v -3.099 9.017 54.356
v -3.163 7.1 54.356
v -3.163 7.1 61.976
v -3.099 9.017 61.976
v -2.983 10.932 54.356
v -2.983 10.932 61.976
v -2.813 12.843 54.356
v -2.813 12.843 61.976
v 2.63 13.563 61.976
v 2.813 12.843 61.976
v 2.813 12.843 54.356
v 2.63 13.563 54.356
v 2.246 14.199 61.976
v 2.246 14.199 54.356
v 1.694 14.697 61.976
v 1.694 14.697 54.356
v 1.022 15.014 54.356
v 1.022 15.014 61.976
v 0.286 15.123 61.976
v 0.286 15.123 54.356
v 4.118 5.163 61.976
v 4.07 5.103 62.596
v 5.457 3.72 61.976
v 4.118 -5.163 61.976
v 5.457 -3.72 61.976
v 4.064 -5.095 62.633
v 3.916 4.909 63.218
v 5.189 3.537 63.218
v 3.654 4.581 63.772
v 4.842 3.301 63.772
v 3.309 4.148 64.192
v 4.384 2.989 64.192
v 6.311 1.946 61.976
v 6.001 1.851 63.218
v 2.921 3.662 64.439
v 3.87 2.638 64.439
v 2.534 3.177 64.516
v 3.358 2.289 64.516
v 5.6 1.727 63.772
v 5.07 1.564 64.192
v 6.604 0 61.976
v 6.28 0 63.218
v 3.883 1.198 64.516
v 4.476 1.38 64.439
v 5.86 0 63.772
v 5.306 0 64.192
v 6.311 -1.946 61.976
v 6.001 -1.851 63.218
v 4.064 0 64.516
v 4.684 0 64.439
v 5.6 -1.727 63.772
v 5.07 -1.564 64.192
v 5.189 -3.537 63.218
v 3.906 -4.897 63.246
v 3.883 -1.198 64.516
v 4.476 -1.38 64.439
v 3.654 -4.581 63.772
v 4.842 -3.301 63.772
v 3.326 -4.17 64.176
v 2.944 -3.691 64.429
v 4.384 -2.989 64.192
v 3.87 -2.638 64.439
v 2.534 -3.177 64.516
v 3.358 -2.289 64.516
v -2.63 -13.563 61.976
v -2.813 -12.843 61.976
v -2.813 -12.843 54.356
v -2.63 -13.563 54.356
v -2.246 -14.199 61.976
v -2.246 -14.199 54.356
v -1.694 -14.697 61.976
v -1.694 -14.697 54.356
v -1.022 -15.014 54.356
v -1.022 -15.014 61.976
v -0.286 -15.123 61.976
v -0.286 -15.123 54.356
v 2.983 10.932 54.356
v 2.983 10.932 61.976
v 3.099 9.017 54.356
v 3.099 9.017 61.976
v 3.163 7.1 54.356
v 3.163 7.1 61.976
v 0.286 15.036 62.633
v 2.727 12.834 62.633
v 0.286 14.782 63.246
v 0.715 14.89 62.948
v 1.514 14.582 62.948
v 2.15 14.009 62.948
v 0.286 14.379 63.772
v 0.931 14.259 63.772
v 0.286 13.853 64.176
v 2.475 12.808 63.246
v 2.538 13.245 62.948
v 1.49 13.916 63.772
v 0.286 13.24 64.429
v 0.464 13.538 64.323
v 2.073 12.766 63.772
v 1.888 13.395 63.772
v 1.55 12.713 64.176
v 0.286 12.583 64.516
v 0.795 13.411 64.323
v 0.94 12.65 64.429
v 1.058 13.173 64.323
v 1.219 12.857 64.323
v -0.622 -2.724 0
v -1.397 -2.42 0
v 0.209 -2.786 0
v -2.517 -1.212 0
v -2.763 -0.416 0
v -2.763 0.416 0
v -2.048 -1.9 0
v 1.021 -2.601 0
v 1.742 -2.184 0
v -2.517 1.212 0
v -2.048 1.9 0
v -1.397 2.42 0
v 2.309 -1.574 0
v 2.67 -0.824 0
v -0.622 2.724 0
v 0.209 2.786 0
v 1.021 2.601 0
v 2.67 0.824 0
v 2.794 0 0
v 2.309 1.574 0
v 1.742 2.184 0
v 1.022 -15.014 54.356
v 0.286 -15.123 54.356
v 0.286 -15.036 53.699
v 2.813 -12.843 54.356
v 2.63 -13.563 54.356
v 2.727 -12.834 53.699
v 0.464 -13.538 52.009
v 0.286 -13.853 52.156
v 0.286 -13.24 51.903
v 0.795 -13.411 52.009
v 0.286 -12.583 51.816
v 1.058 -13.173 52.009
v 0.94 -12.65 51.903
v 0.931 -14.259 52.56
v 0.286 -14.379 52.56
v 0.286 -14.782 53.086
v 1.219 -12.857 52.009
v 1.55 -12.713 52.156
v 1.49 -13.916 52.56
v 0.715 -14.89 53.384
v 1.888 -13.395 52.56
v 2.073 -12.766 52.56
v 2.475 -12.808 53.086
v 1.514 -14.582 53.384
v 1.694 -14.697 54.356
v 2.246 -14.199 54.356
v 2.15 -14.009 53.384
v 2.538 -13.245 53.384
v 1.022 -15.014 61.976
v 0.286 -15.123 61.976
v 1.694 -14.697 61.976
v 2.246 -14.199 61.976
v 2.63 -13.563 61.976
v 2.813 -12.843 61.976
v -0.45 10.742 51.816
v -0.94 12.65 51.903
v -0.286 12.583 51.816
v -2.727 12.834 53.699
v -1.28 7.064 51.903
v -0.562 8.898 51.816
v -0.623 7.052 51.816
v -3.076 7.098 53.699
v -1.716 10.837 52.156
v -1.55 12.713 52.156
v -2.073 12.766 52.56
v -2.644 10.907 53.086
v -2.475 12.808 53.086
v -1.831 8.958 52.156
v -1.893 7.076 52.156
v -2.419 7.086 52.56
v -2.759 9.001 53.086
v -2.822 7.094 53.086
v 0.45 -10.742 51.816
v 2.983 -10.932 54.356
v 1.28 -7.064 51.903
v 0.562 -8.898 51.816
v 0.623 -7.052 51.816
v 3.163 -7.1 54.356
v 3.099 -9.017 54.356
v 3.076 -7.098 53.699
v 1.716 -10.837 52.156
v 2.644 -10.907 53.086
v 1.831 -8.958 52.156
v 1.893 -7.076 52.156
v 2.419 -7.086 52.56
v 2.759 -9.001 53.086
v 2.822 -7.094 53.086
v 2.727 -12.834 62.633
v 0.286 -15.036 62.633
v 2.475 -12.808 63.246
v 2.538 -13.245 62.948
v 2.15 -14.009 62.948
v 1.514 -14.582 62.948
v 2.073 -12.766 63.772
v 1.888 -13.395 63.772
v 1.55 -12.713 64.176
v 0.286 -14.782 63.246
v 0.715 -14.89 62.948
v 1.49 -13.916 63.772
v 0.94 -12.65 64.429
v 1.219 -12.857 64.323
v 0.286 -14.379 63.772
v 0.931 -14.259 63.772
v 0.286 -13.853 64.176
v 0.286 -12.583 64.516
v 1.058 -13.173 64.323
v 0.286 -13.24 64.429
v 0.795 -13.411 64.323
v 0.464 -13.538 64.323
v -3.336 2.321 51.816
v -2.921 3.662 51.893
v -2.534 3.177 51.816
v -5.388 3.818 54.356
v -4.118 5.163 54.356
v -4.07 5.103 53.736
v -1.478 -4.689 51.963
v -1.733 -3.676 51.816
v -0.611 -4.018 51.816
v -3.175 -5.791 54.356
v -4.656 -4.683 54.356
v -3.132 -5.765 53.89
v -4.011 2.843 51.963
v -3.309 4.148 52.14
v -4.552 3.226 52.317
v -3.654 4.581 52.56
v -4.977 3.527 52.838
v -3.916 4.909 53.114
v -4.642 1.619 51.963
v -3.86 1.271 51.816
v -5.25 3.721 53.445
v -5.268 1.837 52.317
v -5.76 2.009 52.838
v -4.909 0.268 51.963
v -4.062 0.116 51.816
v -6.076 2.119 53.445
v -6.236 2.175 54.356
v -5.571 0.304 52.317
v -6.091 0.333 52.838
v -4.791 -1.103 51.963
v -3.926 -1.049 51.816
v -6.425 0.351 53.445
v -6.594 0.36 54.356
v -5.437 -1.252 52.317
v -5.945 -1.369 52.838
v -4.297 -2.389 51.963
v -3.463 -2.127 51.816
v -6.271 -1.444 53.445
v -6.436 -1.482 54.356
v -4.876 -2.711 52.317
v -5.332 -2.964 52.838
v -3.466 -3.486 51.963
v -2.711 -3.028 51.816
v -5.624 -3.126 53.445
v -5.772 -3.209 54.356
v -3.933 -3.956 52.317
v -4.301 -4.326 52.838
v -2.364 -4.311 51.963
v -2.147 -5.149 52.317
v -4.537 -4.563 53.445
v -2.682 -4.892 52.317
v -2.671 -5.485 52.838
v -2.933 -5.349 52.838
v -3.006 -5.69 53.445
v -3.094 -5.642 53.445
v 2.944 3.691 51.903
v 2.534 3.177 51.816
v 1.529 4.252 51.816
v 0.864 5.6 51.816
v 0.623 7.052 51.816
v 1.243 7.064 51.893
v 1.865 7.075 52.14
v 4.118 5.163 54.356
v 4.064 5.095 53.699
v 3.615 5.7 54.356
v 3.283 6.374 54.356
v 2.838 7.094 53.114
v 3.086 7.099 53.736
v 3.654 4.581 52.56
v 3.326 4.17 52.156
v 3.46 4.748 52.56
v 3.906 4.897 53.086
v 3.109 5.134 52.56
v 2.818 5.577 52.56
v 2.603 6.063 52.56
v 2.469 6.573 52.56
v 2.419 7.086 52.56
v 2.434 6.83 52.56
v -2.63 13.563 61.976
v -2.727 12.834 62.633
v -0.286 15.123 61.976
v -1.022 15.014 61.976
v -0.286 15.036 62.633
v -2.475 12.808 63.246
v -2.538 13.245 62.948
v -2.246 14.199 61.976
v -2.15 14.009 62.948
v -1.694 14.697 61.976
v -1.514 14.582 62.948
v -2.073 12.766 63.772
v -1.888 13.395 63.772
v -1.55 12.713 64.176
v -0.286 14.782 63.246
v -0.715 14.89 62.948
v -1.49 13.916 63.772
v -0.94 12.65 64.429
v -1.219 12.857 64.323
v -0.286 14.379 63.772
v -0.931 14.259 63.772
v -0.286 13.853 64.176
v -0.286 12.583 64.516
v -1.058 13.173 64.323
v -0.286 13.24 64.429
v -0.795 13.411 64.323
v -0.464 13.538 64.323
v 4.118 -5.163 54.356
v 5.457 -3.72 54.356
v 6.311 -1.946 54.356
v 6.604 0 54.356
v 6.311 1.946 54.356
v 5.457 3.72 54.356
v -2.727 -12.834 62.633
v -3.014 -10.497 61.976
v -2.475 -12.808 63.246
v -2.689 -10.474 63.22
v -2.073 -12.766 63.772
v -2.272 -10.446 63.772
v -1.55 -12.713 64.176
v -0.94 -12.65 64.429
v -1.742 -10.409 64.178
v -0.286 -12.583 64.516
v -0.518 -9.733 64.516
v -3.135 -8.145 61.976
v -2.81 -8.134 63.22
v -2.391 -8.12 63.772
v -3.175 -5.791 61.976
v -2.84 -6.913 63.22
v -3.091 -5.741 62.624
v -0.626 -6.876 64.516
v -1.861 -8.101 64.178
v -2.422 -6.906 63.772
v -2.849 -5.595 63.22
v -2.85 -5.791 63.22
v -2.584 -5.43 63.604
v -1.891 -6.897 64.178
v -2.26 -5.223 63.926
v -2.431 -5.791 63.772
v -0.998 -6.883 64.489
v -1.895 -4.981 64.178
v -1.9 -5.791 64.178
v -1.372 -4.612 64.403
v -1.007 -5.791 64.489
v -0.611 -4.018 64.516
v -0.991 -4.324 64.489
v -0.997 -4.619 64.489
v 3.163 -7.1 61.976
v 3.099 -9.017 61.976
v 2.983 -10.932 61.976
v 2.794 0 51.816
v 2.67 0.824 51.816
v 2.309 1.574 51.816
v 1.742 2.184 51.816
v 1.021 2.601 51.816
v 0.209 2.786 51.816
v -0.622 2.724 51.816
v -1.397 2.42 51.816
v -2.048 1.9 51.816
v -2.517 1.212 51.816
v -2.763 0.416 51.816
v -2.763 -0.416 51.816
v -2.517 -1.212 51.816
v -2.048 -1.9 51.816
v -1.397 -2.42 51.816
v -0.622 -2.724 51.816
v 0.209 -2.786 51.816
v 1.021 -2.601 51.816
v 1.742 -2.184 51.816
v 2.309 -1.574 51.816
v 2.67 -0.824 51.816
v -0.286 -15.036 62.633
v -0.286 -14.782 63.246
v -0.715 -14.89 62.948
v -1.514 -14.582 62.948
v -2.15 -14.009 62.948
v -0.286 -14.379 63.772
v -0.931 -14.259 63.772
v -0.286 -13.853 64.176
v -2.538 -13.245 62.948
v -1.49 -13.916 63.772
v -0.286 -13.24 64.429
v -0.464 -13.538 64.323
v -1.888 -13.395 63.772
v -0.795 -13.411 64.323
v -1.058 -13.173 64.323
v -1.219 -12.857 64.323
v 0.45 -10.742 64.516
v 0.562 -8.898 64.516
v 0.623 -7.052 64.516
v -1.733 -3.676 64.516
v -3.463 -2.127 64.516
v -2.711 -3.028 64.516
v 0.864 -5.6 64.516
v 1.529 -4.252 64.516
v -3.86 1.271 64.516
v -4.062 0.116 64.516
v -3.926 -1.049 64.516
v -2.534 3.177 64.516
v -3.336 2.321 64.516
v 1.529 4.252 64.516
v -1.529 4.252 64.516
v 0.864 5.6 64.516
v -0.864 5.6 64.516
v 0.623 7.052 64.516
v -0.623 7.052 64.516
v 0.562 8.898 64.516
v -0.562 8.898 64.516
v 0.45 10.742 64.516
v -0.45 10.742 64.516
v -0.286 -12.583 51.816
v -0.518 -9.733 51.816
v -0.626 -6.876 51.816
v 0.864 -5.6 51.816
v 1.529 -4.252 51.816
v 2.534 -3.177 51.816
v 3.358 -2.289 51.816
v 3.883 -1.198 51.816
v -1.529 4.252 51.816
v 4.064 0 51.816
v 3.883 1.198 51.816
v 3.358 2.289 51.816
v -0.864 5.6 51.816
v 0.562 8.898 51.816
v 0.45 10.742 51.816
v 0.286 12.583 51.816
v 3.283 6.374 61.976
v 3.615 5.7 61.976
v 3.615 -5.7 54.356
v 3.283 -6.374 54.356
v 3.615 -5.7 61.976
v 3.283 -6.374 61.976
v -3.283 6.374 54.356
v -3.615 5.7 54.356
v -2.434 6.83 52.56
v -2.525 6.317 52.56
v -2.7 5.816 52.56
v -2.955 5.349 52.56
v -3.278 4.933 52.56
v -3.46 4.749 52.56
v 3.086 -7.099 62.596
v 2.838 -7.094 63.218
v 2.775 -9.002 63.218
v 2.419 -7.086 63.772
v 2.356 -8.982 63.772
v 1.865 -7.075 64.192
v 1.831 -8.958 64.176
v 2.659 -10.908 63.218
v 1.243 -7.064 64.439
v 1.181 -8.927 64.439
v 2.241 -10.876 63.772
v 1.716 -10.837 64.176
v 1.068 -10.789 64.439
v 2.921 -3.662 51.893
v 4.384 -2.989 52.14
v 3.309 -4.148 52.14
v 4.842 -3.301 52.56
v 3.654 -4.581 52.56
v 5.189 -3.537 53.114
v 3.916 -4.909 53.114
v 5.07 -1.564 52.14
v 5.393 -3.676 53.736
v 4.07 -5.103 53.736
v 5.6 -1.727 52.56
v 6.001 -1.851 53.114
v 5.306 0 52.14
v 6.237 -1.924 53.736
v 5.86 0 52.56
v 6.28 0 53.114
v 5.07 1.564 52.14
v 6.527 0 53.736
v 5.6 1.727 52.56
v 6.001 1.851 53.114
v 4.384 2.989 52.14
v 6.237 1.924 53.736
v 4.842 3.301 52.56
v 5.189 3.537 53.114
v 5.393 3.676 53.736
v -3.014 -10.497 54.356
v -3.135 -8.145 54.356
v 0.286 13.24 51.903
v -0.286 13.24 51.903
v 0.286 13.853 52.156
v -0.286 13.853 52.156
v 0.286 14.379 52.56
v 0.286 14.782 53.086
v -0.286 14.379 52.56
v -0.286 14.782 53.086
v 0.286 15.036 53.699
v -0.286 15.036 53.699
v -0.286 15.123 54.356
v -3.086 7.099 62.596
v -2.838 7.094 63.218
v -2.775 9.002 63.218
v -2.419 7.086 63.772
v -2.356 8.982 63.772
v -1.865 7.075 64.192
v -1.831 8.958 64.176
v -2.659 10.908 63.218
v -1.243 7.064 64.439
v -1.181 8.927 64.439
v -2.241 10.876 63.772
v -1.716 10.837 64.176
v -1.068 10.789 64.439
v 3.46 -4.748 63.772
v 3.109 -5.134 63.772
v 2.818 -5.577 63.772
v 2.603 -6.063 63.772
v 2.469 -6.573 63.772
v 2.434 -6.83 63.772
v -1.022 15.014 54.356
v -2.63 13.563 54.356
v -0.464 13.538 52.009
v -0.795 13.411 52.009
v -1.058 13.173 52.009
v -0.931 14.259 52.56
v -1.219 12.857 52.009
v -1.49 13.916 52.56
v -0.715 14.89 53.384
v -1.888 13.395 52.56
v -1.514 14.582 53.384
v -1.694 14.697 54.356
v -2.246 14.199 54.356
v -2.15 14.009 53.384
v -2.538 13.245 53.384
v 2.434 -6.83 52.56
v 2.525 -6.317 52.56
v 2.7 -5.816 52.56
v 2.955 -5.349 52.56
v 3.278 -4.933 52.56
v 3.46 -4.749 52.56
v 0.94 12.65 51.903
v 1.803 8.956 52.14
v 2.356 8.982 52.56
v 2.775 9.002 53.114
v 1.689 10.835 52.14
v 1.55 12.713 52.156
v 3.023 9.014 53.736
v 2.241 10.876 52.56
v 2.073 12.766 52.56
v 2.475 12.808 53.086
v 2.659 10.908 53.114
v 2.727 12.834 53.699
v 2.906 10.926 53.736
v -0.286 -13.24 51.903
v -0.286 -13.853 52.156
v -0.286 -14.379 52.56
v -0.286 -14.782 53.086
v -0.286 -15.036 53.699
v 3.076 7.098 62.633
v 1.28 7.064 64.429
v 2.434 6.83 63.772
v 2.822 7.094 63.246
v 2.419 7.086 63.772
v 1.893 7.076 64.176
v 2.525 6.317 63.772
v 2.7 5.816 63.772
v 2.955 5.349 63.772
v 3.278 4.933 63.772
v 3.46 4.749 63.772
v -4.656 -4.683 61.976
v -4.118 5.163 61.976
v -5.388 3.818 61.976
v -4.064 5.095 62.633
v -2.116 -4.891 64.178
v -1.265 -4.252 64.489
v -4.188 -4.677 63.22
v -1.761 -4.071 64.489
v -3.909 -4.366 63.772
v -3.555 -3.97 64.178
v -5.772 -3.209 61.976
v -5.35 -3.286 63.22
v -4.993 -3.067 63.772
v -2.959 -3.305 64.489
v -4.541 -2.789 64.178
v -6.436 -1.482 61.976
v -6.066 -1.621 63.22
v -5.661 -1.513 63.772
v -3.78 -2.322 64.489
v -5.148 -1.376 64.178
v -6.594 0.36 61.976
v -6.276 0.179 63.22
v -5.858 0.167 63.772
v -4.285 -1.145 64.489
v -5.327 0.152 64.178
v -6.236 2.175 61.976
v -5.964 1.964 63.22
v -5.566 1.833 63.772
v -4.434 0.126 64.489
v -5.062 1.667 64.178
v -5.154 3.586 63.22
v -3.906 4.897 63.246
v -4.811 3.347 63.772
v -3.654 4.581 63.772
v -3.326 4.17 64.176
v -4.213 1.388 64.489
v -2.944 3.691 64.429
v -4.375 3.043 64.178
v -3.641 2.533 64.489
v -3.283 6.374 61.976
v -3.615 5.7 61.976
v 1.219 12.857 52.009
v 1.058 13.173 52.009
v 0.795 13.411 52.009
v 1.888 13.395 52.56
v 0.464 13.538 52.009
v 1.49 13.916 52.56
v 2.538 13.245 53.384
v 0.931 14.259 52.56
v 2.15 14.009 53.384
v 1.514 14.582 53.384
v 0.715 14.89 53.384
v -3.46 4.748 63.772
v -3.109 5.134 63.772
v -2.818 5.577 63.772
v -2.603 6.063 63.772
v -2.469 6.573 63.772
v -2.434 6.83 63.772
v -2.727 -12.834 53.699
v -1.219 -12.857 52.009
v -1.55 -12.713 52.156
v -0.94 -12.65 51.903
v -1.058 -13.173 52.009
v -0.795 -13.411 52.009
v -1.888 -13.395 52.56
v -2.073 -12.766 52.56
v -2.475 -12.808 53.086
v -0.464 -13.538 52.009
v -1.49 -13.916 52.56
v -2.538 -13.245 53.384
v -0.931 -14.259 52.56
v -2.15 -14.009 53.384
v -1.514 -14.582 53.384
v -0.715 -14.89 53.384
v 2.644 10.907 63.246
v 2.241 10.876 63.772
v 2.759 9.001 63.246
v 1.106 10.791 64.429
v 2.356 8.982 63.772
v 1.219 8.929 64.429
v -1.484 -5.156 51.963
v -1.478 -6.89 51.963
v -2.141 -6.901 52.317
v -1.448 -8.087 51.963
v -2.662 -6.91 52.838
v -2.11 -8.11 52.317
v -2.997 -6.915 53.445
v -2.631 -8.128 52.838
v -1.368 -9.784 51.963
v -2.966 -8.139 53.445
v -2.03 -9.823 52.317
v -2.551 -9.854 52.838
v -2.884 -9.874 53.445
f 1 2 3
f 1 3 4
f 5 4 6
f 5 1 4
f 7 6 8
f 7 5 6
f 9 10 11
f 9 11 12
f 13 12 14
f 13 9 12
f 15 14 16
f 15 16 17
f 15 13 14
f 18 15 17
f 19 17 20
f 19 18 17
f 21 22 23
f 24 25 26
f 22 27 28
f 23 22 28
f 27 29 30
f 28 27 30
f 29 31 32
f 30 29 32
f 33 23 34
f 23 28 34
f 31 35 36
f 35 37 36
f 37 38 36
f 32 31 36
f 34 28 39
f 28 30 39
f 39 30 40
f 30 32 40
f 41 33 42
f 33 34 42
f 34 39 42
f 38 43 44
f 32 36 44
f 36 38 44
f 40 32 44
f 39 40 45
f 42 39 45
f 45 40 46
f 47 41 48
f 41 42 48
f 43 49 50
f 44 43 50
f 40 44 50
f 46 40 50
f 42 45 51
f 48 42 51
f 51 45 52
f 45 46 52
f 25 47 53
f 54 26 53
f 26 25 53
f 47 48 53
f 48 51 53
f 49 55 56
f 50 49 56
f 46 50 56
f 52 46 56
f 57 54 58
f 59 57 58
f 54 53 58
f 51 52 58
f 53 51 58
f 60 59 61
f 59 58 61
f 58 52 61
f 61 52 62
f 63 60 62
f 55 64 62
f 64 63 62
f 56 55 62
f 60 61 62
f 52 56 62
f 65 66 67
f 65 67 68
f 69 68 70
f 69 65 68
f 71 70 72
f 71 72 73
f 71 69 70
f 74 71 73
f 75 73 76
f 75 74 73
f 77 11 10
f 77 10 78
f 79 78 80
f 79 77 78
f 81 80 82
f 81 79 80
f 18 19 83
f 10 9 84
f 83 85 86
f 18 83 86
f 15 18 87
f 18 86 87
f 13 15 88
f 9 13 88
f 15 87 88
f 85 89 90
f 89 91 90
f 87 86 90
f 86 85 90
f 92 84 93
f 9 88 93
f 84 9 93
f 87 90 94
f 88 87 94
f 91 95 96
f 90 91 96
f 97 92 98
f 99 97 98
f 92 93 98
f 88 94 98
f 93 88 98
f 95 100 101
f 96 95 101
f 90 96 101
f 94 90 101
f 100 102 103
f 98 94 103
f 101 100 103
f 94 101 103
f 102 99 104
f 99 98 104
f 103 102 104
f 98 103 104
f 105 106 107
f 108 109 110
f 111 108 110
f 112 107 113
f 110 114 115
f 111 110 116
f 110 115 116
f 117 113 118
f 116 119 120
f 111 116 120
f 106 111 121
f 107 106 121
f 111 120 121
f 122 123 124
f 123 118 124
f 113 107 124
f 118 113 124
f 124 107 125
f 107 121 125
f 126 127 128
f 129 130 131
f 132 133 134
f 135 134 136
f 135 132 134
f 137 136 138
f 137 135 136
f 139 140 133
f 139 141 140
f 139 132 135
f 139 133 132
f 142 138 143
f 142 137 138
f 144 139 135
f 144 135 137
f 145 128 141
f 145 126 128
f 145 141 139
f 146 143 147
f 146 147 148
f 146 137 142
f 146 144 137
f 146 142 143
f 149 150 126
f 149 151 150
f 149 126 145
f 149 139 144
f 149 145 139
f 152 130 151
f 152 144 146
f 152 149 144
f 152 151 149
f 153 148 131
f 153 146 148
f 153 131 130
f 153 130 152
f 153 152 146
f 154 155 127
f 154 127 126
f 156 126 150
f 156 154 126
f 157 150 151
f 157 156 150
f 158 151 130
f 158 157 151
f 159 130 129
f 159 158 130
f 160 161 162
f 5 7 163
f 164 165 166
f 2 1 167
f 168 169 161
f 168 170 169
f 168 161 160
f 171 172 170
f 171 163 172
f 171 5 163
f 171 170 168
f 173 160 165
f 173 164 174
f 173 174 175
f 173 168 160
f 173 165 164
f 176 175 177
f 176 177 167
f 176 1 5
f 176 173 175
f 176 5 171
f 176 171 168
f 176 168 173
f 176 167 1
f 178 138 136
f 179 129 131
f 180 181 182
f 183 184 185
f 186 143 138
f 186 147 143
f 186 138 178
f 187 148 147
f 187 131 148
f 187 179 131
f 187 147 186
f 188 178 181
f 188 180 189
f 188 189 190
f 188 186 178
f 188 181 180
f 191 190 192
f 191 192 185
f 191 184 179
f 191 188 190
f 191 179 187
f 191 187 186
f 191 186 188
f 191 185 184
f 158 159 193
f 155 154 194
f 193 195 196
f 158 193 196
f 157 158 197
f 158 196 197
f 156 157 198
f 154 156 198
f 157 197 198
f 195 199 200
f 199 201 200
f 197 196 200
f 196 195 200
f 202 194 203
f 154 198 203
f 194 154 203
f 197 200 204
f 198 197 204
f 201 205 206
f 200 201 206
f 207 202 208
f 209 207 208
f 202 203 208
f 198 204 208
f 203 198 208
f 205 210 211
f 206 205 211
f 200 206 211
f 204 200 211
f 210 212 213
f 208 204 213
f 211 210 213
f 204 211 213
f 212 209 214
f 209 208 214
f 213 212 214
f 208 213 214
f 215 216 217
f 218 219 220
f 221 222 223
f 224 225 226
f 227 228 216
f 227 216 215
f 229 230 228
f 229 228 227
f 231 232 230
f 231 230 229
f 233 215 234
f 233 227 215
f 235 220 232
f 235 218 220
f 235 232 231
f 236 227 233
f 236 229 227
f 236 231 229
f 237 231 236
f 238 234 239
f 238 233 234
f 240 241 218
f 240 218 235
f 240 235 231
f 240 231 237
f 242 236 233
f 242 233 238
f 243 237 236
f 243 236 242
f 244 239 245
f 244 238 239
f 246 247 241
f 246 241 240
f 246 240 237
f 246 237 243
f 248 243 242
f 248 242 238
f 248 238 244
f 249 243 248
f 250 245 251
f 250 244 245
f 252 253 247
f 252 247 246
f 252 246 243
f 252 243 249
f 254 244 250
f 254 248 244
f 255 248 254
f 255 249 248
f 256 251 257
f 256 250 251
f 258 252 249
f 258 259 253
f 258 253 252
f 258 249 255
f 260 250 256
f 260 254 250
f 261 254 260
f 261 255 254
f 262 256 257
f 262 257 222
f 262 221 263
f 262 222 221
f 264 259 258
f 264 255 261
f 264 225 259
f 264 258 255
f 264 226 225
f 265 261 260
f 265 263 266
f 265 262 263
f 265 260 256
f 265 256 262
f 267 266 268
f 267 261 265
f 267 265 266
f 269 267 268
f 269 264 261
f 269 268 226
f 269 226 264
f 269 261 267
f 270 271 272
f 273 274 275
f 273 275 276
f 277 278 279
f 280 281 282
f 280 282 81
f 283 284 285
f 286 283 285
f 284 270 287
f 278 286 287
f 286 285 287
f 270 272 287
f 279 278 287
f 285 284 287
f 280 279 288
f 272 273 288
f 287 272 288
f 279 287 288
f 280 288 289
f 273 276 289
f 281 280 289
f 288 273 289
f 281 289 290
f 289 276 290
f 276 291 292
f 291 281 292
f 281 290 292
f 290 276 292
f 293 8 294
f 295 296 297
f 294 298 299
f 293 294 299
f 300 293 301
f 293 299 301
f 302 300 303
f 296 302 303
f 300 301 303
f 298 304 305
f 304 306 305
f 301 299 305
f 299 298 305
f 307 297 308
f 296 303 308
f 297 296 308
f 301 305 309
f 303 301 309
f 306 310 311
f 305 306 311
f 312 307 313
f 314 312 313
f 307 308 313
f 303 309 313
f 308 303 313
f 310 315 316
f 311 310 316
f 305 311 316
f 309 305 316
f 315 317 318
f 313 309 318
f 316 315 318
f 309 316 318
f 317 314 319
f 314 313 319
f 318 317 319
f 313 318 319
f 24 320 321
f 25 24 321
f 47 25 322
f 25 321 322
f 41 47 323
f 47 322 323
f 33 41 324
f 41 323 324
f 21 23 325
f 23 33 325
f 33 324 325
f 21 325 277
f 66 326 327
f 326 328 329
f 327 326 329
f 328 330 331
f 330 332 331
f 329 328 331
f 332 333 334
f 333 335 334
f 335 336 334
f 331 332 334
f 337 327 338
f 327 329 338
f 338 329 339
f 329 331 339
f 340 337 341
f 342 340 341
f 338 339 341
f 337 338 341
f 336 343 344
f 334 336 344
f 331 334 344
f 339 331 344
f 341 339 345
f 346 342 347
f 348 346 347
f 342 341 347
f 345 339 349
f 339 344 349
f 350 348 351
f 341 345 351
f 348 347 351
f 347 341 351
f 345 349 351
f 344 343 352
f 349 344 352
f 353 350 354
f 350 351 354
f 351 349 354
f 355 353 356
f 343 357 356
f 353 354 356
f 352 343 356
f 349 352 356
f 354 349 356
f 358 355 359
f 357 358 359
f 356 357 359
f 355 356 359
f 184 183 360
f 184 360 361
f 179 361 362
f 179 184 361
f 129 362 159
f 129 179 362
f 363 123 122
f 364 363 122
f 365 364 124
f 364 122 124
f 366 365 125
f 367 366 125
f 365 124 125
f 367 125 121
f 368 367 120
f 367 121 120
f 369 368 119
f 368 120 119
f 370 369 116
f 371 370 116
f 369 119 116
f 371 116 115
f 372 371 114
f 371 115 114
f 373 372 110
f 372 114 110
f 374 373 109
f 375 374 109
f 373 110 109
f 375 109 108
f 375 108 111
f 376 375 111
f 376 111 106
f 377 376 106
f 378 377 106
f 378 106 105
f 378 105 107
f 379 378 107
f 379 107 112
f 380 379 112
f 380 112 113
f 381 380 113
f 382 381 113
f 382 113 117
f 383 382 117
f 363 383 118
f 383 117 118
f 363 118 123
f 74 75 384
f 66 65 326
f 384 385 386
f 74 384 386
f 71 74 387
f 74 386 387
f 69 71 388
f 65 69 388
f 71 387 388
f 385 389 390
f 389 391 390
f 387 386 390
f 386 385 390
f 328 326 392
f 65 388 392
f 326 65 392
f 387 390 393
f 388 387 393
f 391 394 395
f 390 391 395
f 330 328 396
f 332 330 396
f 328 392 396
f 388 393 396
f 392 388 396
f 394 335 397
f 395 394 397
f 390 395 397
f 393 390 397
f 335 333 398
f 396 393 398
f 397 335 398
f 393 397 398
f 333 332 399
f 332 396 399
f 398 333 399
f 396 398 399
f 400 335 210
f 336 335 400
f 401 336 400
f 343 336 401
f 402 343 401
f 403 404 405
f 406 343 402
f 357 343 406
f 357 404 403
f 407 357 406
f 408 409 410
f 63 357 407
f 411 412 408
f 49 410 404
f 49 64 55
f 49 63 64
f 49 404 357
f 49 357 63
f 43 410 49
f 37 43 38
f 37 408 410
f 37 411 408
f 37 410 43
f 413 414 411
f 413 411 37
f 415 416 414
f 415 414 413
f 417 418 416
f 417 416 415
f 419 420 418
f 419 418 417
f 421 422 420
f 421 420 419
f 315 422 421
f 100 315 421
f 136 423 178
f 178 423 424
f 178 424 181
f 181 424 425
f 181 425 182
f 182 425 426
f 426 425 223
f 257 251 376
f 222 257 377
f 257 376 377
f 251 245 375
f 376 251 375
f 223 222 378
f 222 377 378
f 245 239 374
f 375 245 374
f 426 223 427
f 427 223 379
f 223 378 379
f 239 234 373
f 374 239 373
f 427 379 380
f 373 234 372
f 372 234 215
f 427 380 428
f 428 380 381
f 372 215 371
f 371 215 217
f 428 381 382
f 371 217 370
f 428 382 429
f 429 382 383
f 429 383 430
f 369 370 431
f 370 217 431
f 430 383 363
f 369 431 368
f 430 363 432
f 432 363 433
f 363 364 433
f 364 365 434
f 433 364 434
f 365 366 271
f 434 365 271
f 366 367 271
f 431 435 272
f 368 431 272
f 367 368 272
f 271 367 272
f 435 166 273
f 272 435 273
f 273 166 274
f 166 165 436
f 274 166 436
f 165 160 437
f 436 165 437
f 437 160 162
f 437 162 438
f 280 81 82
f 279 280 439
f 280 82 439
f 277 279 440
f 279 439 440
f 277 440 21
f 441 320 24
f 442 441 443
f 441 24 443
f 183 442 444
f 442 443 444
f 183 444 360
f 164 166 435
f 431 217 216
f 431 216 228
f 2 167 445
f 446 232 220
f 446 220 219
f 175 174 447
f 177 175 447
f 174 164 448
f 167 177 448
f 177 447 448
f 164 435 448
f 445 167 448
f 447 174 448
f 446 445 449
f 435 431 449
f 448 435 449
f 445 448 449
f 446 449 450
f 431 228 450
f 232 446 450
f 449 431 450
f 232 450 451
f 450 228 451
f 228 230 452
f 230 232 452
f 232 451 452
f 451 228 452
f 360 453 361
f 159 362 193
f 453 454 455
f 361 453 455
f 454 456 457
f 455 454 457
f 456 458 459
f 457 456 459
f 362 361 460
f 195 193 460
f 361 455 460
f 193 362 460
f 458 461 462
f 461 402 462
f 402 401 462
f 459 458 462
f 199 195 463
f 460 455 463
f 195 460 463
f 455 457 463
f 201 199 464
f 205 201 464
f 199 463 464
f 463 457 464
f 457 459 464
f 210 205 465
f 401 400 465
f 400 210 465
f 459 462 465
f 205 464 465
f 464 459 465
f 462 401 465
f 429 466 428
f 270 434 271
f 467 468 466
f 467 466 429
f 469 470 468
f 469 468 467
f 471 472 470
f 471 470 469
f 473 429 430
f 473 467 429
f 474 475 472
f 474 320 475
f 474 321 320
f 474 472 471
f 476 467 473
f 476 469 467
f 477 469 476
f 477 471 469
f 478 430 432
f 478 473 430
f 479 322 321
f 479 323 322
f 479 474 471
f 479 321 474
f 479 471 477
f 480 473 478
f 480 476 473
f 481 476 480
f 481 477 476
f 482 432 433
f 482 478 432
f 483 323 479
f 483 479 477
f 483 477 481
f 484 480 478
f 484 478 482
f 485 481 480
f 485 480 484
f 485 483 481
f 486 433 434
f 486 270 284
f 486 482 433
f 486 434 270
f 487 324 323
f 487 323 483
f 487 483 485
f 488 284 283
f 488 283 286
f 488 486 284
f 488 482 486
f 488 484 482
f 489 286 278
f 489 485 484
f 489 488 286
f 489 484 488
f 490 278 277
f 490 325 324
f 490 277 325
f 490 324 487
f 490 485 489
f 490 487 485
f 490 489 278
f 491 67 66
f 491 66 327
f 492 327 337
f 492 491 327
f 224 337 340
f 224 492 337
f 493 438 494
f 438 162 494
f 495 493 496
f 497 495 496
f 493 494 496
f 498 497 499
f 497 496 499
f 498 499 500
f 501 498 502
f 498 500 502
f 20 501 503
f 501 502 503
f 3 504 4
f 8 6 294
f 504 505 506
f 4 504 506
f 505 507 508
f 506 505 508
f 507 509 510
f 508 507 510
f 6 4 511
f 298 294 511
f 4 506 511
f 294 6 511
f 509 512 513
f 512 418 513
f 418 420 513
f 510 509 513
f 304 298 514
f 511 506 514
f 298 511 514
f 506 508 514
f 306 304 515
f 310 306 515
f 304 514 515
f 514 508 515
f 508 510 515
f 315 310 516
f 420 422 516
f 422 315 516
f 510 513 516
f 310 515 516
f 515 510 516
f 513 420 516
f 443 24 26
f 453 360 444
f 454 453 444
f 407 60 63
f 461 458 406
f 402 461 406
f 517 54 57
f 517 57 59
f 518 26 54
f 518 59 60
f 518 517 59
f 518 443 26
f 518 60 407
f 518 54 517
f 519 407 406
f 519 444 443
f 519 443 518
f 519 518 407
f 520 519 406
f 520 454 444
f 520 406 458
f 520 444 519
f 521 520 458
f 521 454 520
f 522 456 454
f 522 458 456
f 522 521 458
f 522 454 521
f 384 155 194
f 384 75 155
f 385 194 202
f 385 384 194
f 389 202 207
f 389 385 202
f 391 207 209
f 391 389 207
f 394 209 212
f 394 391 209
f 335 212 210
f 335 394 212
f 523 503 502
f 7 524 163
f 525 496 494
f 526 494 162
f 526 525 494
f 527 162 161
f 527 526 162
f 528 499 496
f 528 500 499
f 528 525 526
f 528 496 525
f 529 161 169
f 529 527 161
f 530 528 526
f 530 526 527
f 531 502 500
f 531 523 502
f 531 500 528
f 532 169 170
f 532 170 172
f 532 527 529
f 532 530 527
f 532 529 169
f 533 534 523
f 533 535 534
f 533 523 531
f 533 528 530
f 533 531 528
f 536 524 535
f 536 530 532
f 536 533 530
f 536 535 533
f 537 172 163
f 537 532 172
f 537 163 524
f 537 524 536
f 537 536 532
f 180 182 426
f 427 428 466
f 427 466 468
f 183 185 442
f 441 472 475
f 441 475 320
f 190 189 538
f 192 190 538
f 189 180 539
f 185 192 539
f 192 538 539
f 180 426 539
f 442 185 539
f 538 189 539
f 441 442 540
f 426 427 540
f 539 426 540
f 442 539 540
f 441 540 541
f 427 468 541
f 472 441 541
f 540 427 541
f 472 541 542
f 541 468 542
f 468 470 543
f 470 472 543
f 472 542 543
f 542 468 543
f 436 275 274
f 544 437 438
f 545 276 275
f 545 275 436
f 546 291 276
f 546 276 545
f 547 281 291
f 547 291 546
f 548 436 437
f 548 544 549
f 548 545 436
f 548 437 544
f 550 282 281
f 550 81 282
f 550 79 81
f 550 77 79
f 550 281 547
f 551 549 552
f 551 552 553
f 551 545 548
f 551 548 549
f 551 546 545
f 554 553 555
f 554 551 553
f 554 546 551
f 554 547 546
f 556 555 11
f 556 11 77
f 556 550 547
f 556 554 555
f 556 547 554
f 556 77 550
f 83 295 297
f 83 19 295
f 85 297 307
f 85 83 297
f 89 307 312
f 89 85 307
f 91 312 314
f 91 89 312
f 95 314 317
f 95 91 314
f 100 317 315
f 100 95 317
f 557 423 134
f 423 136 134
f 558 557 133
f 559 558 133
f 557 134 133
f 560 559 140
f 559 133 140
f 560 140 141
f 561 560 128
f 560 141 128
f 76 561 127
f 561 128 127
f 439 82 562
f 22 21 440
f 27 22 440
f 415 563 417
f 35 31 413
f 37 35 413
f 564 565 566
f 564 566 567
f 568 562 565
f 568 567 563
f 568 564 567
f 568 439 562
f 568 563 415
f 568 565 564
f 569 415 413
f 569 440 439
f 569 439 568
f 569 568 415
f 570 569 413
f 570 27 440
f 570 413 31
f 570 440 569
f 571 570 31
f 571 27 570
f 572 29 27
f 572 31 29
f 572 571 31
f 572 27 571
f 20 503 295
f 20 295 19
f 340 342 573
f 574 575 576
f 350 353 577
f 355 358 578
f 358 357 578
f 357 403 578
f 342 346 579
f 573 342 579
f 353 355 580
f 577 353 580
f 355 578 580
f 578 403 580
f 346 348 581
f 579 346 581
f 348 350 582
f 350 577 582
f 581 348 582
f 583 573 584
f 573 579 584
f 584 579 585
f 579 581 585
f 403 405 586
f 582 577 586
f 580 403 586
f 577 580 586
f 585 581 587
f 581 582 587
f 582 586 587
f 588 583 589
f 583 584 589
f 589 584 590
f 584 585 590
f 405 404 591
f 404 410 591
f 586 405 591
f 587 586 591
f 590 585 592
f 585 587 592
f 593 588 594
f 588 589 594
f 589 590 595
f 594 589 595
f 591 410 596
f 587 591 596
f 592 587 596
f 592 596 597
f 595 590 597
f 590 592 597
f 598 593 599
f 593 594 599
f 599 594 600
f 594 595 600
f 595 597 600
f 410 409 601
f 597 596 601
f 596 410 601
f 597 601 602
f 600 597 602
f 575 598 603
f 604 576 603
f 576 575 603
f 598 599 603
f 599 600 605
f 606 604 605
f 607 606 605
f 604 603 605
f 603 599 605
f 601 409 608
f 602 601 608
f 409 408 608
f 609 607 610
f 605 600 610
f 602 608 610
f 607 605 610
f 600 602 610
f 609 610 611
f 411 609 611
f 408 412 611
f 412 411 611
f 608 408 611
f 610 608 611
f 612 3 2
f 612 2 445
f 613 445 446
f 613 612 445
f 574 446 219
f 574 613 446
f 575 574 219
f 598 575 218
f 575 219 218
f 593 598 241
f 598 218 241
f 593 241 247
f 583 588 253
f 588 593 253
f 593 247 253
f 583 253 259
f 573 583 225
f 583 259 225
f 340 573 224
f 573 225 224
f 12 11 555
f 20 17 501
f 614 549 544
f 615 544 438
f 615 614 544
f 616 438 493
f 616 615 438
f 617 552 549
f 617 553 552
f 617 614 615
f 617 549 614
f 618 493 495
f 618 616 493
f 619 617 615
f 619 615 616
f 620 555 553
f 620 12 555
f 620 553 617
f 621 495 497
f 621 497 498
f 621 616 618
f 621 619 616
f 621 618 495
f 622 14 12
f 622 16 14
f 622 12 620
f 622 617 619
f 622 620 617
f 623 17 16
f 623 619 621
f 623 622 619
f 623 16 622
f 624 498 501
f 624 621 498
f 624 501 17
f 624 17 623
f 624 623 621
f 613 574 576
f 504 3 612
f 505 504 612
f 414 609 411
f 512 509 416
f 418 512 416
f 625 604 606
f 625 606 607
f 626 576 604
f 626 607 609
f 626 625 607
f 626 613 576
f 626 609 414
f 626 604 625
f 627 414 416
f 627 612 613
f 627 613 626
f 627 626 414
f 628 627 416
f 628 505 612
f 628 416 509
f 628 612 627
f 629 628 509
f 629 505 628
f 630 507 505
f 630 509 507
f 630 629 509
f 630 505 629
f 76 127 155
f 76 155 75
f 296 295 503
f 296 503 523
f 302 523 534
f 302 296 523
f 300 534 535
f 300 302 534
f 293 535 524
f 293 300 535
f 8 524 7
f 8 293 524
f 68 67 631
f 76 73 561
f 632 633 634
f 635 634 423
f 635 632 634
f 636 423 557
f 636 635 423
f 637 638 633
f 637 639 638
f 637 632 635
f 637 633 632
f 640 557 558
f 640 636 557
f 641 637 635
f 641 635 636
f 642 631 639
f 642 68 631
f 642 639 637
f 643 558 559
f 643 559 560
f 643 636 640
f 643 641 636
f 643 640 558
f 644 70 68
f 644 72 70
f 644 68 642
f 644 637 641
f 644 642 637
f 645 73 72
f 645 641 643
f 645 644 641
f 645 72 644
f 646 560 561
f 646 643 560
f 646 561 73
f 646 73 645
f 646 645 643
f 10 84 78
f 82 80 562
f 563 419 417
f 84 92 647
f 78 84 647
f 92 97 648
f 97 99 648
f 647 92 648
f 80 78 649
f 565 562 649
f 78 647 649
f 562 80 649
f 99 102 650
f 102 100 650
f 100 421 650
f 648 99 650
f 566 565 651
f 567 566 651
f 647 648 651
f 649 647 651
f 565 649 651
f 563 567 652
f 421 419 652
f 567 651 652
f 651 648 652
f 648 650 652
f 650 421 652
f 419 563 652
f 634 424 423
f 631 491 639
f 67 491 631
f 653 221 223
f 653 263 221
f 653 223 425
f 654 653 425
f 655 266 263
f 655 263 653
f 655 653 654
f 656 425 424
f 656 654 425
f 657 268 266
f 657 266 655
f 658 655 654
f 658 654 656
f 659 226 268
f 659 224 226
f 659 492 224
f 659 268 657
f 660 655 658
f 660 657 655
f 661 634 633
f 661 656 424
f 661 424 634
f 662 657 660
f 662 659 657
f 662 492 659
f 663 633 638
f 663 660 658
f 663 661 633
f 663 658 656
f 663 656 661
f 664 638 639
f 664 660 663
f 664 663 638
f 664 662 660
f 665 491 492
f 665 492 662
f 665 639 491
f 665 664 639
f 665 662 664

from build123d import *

# Parameters (mm, degrees)
SKETCH1_R      = 2.794
EXTRUDE1_DEPTH = 51.816
SKETCH2_R      = 6.604
EXTRUDE2_DEPTH = 12.7
EXTRUDE3_START = -12.7
EXTRUDE3_DEPTH = 12.7
FILLET1_R      = 2.54
FILLET2_R      = 2.54


with BuildPart() as part:
    # Sketch1 → Extrude1 (new body)
    with BuildSketch(Plane.XY):
        Circle(SKETCH1_R)
    extrude(amount=EXTRUDE1_DEPTH)

    # Sketch2 → Extrude2 (add)
    with BuildSketch(Plane.XY.offset(51.816)):
        Circle(SKETCH2_R)
    extrude(amount=EXTRUDE2_DEPTH)

    # Sketch3 → Extrude3 (add)
    with BuildSketch(Plane.XY.offset(64.516).offset(EXTRUDE3_START)):
        with BuildLine():
            Line((-2.54, 15.122583735), (2.54, 15.122583735))
            ThreePointArc((2.54, 15.122583735), (3.016066659, 10.467431069), (3.175, 5.790698663))
            ThreePointArc((3.175, 5.790698663), (0, 6.604), (-3.175, 5.790698663))
            ThreePointArc((-3.175, 5.790698663), (-3.016066659, 10.467431069), (-2.54, 15.122583735))
        make_face()
        with BuildLine():
            Line((2.54, -15.122583735), (-2.54, -15.122583735))
            ThreePointArc((-2.54, -15.122583735), (-3.016066659, -10.467431069), (-3.175, -5.790698663))
            ThreePointArc((-3.175, -5.790698663), (0, -6.604), (3.175, -5.790698663))
            ThreePointArc((3.175, -5.790698663), (3.016066659, -10.467431069), (2.54, -15.122583735))
        make_face()
    extrude(amount=EXTRUDE3_DEPTH)

    # Fillet1
    fillet1_edges = [part.edges().sort_by_distance(p)[0] for p in [
        (-2.54, 15.122583735, 58.166),
        (2.54, 15.122583735, 58.166),
        (2.54, -15.122583735, 58.166),
        (-2.54, -15.122583735, 58.166),
    ]]
    fillet(fillet1_edges, radius=FILLET1_R)

    # Fillet2
    fillet2_edges = [part.edges().sort_by_distance(p)[0] for p in [
        (-3.175, 5.790698663, 58.166),
        (3.175, 5.790698663, 58.166),
        (3.175, -5.790698663, 58.166),
    ]]
    fillet(fillet2_edges, radius=FILLET2_R)
    fillet2_2_edges = [part.edges().sort_by_distance(p)[0] for p in [
        (-6.57965204, -0.566564238, 51.816),
        (3.047804414, 9.974982228, 64.516),
        (-3.047804414, 9.974982228, 51.816),
        (6.604, 0, 64.516),
        (6.604, 0, 51.816),
        (-3.084466617, -9.321288711, 64.516),
        (3.047804414, -9.974982228, 51.816),
        (-3.084466617, -9.321288711, 51.816),
        (0, -15.122583735, 64.516),
        (3.047804414, -9.974982228, 64.516),
        (0, 15.122583735, 64.516),
        (-3.047804414, 9.974982228, 64.516),
        (1.98808874, 14.468324748, 64.516),
        (-1.98808874, 14.468324748, 64.516),
        (1.98808874, -14.468324748, 64.516),
        (-1.98808874, -14.468324748, 64.516),
        (0, -15.122583735, 51.816),
        (0, 15.122583735, 51.816),
        (3.047804414, 9.974982228, 51.816),
        (1.98808874, 14.468324748, 51.816),
        (-1.98808874, 14.468324748, 51.816),
        (1.98808874, -14.468324748, 51.816),
        (-1.98808874, -14.468324748, 51.816),
        (-6.57965204, -0.566564238, 64.516),
        (-3.424141618, 6.02472451, 64.516),
        (3.424141618, 6.02472451, 51.816),
        (3.424141618, -6.02472451, 64.516),
        (3.424141618, -6.02472451, 51.816),
        (3.424141618, 6.02472451, 64.516),
        (-3.424141618, 6.02472451, 51.816),
    ]]
    fillet(fillet2_2_edges, radius=FILLET2_R)


solid = part.part
